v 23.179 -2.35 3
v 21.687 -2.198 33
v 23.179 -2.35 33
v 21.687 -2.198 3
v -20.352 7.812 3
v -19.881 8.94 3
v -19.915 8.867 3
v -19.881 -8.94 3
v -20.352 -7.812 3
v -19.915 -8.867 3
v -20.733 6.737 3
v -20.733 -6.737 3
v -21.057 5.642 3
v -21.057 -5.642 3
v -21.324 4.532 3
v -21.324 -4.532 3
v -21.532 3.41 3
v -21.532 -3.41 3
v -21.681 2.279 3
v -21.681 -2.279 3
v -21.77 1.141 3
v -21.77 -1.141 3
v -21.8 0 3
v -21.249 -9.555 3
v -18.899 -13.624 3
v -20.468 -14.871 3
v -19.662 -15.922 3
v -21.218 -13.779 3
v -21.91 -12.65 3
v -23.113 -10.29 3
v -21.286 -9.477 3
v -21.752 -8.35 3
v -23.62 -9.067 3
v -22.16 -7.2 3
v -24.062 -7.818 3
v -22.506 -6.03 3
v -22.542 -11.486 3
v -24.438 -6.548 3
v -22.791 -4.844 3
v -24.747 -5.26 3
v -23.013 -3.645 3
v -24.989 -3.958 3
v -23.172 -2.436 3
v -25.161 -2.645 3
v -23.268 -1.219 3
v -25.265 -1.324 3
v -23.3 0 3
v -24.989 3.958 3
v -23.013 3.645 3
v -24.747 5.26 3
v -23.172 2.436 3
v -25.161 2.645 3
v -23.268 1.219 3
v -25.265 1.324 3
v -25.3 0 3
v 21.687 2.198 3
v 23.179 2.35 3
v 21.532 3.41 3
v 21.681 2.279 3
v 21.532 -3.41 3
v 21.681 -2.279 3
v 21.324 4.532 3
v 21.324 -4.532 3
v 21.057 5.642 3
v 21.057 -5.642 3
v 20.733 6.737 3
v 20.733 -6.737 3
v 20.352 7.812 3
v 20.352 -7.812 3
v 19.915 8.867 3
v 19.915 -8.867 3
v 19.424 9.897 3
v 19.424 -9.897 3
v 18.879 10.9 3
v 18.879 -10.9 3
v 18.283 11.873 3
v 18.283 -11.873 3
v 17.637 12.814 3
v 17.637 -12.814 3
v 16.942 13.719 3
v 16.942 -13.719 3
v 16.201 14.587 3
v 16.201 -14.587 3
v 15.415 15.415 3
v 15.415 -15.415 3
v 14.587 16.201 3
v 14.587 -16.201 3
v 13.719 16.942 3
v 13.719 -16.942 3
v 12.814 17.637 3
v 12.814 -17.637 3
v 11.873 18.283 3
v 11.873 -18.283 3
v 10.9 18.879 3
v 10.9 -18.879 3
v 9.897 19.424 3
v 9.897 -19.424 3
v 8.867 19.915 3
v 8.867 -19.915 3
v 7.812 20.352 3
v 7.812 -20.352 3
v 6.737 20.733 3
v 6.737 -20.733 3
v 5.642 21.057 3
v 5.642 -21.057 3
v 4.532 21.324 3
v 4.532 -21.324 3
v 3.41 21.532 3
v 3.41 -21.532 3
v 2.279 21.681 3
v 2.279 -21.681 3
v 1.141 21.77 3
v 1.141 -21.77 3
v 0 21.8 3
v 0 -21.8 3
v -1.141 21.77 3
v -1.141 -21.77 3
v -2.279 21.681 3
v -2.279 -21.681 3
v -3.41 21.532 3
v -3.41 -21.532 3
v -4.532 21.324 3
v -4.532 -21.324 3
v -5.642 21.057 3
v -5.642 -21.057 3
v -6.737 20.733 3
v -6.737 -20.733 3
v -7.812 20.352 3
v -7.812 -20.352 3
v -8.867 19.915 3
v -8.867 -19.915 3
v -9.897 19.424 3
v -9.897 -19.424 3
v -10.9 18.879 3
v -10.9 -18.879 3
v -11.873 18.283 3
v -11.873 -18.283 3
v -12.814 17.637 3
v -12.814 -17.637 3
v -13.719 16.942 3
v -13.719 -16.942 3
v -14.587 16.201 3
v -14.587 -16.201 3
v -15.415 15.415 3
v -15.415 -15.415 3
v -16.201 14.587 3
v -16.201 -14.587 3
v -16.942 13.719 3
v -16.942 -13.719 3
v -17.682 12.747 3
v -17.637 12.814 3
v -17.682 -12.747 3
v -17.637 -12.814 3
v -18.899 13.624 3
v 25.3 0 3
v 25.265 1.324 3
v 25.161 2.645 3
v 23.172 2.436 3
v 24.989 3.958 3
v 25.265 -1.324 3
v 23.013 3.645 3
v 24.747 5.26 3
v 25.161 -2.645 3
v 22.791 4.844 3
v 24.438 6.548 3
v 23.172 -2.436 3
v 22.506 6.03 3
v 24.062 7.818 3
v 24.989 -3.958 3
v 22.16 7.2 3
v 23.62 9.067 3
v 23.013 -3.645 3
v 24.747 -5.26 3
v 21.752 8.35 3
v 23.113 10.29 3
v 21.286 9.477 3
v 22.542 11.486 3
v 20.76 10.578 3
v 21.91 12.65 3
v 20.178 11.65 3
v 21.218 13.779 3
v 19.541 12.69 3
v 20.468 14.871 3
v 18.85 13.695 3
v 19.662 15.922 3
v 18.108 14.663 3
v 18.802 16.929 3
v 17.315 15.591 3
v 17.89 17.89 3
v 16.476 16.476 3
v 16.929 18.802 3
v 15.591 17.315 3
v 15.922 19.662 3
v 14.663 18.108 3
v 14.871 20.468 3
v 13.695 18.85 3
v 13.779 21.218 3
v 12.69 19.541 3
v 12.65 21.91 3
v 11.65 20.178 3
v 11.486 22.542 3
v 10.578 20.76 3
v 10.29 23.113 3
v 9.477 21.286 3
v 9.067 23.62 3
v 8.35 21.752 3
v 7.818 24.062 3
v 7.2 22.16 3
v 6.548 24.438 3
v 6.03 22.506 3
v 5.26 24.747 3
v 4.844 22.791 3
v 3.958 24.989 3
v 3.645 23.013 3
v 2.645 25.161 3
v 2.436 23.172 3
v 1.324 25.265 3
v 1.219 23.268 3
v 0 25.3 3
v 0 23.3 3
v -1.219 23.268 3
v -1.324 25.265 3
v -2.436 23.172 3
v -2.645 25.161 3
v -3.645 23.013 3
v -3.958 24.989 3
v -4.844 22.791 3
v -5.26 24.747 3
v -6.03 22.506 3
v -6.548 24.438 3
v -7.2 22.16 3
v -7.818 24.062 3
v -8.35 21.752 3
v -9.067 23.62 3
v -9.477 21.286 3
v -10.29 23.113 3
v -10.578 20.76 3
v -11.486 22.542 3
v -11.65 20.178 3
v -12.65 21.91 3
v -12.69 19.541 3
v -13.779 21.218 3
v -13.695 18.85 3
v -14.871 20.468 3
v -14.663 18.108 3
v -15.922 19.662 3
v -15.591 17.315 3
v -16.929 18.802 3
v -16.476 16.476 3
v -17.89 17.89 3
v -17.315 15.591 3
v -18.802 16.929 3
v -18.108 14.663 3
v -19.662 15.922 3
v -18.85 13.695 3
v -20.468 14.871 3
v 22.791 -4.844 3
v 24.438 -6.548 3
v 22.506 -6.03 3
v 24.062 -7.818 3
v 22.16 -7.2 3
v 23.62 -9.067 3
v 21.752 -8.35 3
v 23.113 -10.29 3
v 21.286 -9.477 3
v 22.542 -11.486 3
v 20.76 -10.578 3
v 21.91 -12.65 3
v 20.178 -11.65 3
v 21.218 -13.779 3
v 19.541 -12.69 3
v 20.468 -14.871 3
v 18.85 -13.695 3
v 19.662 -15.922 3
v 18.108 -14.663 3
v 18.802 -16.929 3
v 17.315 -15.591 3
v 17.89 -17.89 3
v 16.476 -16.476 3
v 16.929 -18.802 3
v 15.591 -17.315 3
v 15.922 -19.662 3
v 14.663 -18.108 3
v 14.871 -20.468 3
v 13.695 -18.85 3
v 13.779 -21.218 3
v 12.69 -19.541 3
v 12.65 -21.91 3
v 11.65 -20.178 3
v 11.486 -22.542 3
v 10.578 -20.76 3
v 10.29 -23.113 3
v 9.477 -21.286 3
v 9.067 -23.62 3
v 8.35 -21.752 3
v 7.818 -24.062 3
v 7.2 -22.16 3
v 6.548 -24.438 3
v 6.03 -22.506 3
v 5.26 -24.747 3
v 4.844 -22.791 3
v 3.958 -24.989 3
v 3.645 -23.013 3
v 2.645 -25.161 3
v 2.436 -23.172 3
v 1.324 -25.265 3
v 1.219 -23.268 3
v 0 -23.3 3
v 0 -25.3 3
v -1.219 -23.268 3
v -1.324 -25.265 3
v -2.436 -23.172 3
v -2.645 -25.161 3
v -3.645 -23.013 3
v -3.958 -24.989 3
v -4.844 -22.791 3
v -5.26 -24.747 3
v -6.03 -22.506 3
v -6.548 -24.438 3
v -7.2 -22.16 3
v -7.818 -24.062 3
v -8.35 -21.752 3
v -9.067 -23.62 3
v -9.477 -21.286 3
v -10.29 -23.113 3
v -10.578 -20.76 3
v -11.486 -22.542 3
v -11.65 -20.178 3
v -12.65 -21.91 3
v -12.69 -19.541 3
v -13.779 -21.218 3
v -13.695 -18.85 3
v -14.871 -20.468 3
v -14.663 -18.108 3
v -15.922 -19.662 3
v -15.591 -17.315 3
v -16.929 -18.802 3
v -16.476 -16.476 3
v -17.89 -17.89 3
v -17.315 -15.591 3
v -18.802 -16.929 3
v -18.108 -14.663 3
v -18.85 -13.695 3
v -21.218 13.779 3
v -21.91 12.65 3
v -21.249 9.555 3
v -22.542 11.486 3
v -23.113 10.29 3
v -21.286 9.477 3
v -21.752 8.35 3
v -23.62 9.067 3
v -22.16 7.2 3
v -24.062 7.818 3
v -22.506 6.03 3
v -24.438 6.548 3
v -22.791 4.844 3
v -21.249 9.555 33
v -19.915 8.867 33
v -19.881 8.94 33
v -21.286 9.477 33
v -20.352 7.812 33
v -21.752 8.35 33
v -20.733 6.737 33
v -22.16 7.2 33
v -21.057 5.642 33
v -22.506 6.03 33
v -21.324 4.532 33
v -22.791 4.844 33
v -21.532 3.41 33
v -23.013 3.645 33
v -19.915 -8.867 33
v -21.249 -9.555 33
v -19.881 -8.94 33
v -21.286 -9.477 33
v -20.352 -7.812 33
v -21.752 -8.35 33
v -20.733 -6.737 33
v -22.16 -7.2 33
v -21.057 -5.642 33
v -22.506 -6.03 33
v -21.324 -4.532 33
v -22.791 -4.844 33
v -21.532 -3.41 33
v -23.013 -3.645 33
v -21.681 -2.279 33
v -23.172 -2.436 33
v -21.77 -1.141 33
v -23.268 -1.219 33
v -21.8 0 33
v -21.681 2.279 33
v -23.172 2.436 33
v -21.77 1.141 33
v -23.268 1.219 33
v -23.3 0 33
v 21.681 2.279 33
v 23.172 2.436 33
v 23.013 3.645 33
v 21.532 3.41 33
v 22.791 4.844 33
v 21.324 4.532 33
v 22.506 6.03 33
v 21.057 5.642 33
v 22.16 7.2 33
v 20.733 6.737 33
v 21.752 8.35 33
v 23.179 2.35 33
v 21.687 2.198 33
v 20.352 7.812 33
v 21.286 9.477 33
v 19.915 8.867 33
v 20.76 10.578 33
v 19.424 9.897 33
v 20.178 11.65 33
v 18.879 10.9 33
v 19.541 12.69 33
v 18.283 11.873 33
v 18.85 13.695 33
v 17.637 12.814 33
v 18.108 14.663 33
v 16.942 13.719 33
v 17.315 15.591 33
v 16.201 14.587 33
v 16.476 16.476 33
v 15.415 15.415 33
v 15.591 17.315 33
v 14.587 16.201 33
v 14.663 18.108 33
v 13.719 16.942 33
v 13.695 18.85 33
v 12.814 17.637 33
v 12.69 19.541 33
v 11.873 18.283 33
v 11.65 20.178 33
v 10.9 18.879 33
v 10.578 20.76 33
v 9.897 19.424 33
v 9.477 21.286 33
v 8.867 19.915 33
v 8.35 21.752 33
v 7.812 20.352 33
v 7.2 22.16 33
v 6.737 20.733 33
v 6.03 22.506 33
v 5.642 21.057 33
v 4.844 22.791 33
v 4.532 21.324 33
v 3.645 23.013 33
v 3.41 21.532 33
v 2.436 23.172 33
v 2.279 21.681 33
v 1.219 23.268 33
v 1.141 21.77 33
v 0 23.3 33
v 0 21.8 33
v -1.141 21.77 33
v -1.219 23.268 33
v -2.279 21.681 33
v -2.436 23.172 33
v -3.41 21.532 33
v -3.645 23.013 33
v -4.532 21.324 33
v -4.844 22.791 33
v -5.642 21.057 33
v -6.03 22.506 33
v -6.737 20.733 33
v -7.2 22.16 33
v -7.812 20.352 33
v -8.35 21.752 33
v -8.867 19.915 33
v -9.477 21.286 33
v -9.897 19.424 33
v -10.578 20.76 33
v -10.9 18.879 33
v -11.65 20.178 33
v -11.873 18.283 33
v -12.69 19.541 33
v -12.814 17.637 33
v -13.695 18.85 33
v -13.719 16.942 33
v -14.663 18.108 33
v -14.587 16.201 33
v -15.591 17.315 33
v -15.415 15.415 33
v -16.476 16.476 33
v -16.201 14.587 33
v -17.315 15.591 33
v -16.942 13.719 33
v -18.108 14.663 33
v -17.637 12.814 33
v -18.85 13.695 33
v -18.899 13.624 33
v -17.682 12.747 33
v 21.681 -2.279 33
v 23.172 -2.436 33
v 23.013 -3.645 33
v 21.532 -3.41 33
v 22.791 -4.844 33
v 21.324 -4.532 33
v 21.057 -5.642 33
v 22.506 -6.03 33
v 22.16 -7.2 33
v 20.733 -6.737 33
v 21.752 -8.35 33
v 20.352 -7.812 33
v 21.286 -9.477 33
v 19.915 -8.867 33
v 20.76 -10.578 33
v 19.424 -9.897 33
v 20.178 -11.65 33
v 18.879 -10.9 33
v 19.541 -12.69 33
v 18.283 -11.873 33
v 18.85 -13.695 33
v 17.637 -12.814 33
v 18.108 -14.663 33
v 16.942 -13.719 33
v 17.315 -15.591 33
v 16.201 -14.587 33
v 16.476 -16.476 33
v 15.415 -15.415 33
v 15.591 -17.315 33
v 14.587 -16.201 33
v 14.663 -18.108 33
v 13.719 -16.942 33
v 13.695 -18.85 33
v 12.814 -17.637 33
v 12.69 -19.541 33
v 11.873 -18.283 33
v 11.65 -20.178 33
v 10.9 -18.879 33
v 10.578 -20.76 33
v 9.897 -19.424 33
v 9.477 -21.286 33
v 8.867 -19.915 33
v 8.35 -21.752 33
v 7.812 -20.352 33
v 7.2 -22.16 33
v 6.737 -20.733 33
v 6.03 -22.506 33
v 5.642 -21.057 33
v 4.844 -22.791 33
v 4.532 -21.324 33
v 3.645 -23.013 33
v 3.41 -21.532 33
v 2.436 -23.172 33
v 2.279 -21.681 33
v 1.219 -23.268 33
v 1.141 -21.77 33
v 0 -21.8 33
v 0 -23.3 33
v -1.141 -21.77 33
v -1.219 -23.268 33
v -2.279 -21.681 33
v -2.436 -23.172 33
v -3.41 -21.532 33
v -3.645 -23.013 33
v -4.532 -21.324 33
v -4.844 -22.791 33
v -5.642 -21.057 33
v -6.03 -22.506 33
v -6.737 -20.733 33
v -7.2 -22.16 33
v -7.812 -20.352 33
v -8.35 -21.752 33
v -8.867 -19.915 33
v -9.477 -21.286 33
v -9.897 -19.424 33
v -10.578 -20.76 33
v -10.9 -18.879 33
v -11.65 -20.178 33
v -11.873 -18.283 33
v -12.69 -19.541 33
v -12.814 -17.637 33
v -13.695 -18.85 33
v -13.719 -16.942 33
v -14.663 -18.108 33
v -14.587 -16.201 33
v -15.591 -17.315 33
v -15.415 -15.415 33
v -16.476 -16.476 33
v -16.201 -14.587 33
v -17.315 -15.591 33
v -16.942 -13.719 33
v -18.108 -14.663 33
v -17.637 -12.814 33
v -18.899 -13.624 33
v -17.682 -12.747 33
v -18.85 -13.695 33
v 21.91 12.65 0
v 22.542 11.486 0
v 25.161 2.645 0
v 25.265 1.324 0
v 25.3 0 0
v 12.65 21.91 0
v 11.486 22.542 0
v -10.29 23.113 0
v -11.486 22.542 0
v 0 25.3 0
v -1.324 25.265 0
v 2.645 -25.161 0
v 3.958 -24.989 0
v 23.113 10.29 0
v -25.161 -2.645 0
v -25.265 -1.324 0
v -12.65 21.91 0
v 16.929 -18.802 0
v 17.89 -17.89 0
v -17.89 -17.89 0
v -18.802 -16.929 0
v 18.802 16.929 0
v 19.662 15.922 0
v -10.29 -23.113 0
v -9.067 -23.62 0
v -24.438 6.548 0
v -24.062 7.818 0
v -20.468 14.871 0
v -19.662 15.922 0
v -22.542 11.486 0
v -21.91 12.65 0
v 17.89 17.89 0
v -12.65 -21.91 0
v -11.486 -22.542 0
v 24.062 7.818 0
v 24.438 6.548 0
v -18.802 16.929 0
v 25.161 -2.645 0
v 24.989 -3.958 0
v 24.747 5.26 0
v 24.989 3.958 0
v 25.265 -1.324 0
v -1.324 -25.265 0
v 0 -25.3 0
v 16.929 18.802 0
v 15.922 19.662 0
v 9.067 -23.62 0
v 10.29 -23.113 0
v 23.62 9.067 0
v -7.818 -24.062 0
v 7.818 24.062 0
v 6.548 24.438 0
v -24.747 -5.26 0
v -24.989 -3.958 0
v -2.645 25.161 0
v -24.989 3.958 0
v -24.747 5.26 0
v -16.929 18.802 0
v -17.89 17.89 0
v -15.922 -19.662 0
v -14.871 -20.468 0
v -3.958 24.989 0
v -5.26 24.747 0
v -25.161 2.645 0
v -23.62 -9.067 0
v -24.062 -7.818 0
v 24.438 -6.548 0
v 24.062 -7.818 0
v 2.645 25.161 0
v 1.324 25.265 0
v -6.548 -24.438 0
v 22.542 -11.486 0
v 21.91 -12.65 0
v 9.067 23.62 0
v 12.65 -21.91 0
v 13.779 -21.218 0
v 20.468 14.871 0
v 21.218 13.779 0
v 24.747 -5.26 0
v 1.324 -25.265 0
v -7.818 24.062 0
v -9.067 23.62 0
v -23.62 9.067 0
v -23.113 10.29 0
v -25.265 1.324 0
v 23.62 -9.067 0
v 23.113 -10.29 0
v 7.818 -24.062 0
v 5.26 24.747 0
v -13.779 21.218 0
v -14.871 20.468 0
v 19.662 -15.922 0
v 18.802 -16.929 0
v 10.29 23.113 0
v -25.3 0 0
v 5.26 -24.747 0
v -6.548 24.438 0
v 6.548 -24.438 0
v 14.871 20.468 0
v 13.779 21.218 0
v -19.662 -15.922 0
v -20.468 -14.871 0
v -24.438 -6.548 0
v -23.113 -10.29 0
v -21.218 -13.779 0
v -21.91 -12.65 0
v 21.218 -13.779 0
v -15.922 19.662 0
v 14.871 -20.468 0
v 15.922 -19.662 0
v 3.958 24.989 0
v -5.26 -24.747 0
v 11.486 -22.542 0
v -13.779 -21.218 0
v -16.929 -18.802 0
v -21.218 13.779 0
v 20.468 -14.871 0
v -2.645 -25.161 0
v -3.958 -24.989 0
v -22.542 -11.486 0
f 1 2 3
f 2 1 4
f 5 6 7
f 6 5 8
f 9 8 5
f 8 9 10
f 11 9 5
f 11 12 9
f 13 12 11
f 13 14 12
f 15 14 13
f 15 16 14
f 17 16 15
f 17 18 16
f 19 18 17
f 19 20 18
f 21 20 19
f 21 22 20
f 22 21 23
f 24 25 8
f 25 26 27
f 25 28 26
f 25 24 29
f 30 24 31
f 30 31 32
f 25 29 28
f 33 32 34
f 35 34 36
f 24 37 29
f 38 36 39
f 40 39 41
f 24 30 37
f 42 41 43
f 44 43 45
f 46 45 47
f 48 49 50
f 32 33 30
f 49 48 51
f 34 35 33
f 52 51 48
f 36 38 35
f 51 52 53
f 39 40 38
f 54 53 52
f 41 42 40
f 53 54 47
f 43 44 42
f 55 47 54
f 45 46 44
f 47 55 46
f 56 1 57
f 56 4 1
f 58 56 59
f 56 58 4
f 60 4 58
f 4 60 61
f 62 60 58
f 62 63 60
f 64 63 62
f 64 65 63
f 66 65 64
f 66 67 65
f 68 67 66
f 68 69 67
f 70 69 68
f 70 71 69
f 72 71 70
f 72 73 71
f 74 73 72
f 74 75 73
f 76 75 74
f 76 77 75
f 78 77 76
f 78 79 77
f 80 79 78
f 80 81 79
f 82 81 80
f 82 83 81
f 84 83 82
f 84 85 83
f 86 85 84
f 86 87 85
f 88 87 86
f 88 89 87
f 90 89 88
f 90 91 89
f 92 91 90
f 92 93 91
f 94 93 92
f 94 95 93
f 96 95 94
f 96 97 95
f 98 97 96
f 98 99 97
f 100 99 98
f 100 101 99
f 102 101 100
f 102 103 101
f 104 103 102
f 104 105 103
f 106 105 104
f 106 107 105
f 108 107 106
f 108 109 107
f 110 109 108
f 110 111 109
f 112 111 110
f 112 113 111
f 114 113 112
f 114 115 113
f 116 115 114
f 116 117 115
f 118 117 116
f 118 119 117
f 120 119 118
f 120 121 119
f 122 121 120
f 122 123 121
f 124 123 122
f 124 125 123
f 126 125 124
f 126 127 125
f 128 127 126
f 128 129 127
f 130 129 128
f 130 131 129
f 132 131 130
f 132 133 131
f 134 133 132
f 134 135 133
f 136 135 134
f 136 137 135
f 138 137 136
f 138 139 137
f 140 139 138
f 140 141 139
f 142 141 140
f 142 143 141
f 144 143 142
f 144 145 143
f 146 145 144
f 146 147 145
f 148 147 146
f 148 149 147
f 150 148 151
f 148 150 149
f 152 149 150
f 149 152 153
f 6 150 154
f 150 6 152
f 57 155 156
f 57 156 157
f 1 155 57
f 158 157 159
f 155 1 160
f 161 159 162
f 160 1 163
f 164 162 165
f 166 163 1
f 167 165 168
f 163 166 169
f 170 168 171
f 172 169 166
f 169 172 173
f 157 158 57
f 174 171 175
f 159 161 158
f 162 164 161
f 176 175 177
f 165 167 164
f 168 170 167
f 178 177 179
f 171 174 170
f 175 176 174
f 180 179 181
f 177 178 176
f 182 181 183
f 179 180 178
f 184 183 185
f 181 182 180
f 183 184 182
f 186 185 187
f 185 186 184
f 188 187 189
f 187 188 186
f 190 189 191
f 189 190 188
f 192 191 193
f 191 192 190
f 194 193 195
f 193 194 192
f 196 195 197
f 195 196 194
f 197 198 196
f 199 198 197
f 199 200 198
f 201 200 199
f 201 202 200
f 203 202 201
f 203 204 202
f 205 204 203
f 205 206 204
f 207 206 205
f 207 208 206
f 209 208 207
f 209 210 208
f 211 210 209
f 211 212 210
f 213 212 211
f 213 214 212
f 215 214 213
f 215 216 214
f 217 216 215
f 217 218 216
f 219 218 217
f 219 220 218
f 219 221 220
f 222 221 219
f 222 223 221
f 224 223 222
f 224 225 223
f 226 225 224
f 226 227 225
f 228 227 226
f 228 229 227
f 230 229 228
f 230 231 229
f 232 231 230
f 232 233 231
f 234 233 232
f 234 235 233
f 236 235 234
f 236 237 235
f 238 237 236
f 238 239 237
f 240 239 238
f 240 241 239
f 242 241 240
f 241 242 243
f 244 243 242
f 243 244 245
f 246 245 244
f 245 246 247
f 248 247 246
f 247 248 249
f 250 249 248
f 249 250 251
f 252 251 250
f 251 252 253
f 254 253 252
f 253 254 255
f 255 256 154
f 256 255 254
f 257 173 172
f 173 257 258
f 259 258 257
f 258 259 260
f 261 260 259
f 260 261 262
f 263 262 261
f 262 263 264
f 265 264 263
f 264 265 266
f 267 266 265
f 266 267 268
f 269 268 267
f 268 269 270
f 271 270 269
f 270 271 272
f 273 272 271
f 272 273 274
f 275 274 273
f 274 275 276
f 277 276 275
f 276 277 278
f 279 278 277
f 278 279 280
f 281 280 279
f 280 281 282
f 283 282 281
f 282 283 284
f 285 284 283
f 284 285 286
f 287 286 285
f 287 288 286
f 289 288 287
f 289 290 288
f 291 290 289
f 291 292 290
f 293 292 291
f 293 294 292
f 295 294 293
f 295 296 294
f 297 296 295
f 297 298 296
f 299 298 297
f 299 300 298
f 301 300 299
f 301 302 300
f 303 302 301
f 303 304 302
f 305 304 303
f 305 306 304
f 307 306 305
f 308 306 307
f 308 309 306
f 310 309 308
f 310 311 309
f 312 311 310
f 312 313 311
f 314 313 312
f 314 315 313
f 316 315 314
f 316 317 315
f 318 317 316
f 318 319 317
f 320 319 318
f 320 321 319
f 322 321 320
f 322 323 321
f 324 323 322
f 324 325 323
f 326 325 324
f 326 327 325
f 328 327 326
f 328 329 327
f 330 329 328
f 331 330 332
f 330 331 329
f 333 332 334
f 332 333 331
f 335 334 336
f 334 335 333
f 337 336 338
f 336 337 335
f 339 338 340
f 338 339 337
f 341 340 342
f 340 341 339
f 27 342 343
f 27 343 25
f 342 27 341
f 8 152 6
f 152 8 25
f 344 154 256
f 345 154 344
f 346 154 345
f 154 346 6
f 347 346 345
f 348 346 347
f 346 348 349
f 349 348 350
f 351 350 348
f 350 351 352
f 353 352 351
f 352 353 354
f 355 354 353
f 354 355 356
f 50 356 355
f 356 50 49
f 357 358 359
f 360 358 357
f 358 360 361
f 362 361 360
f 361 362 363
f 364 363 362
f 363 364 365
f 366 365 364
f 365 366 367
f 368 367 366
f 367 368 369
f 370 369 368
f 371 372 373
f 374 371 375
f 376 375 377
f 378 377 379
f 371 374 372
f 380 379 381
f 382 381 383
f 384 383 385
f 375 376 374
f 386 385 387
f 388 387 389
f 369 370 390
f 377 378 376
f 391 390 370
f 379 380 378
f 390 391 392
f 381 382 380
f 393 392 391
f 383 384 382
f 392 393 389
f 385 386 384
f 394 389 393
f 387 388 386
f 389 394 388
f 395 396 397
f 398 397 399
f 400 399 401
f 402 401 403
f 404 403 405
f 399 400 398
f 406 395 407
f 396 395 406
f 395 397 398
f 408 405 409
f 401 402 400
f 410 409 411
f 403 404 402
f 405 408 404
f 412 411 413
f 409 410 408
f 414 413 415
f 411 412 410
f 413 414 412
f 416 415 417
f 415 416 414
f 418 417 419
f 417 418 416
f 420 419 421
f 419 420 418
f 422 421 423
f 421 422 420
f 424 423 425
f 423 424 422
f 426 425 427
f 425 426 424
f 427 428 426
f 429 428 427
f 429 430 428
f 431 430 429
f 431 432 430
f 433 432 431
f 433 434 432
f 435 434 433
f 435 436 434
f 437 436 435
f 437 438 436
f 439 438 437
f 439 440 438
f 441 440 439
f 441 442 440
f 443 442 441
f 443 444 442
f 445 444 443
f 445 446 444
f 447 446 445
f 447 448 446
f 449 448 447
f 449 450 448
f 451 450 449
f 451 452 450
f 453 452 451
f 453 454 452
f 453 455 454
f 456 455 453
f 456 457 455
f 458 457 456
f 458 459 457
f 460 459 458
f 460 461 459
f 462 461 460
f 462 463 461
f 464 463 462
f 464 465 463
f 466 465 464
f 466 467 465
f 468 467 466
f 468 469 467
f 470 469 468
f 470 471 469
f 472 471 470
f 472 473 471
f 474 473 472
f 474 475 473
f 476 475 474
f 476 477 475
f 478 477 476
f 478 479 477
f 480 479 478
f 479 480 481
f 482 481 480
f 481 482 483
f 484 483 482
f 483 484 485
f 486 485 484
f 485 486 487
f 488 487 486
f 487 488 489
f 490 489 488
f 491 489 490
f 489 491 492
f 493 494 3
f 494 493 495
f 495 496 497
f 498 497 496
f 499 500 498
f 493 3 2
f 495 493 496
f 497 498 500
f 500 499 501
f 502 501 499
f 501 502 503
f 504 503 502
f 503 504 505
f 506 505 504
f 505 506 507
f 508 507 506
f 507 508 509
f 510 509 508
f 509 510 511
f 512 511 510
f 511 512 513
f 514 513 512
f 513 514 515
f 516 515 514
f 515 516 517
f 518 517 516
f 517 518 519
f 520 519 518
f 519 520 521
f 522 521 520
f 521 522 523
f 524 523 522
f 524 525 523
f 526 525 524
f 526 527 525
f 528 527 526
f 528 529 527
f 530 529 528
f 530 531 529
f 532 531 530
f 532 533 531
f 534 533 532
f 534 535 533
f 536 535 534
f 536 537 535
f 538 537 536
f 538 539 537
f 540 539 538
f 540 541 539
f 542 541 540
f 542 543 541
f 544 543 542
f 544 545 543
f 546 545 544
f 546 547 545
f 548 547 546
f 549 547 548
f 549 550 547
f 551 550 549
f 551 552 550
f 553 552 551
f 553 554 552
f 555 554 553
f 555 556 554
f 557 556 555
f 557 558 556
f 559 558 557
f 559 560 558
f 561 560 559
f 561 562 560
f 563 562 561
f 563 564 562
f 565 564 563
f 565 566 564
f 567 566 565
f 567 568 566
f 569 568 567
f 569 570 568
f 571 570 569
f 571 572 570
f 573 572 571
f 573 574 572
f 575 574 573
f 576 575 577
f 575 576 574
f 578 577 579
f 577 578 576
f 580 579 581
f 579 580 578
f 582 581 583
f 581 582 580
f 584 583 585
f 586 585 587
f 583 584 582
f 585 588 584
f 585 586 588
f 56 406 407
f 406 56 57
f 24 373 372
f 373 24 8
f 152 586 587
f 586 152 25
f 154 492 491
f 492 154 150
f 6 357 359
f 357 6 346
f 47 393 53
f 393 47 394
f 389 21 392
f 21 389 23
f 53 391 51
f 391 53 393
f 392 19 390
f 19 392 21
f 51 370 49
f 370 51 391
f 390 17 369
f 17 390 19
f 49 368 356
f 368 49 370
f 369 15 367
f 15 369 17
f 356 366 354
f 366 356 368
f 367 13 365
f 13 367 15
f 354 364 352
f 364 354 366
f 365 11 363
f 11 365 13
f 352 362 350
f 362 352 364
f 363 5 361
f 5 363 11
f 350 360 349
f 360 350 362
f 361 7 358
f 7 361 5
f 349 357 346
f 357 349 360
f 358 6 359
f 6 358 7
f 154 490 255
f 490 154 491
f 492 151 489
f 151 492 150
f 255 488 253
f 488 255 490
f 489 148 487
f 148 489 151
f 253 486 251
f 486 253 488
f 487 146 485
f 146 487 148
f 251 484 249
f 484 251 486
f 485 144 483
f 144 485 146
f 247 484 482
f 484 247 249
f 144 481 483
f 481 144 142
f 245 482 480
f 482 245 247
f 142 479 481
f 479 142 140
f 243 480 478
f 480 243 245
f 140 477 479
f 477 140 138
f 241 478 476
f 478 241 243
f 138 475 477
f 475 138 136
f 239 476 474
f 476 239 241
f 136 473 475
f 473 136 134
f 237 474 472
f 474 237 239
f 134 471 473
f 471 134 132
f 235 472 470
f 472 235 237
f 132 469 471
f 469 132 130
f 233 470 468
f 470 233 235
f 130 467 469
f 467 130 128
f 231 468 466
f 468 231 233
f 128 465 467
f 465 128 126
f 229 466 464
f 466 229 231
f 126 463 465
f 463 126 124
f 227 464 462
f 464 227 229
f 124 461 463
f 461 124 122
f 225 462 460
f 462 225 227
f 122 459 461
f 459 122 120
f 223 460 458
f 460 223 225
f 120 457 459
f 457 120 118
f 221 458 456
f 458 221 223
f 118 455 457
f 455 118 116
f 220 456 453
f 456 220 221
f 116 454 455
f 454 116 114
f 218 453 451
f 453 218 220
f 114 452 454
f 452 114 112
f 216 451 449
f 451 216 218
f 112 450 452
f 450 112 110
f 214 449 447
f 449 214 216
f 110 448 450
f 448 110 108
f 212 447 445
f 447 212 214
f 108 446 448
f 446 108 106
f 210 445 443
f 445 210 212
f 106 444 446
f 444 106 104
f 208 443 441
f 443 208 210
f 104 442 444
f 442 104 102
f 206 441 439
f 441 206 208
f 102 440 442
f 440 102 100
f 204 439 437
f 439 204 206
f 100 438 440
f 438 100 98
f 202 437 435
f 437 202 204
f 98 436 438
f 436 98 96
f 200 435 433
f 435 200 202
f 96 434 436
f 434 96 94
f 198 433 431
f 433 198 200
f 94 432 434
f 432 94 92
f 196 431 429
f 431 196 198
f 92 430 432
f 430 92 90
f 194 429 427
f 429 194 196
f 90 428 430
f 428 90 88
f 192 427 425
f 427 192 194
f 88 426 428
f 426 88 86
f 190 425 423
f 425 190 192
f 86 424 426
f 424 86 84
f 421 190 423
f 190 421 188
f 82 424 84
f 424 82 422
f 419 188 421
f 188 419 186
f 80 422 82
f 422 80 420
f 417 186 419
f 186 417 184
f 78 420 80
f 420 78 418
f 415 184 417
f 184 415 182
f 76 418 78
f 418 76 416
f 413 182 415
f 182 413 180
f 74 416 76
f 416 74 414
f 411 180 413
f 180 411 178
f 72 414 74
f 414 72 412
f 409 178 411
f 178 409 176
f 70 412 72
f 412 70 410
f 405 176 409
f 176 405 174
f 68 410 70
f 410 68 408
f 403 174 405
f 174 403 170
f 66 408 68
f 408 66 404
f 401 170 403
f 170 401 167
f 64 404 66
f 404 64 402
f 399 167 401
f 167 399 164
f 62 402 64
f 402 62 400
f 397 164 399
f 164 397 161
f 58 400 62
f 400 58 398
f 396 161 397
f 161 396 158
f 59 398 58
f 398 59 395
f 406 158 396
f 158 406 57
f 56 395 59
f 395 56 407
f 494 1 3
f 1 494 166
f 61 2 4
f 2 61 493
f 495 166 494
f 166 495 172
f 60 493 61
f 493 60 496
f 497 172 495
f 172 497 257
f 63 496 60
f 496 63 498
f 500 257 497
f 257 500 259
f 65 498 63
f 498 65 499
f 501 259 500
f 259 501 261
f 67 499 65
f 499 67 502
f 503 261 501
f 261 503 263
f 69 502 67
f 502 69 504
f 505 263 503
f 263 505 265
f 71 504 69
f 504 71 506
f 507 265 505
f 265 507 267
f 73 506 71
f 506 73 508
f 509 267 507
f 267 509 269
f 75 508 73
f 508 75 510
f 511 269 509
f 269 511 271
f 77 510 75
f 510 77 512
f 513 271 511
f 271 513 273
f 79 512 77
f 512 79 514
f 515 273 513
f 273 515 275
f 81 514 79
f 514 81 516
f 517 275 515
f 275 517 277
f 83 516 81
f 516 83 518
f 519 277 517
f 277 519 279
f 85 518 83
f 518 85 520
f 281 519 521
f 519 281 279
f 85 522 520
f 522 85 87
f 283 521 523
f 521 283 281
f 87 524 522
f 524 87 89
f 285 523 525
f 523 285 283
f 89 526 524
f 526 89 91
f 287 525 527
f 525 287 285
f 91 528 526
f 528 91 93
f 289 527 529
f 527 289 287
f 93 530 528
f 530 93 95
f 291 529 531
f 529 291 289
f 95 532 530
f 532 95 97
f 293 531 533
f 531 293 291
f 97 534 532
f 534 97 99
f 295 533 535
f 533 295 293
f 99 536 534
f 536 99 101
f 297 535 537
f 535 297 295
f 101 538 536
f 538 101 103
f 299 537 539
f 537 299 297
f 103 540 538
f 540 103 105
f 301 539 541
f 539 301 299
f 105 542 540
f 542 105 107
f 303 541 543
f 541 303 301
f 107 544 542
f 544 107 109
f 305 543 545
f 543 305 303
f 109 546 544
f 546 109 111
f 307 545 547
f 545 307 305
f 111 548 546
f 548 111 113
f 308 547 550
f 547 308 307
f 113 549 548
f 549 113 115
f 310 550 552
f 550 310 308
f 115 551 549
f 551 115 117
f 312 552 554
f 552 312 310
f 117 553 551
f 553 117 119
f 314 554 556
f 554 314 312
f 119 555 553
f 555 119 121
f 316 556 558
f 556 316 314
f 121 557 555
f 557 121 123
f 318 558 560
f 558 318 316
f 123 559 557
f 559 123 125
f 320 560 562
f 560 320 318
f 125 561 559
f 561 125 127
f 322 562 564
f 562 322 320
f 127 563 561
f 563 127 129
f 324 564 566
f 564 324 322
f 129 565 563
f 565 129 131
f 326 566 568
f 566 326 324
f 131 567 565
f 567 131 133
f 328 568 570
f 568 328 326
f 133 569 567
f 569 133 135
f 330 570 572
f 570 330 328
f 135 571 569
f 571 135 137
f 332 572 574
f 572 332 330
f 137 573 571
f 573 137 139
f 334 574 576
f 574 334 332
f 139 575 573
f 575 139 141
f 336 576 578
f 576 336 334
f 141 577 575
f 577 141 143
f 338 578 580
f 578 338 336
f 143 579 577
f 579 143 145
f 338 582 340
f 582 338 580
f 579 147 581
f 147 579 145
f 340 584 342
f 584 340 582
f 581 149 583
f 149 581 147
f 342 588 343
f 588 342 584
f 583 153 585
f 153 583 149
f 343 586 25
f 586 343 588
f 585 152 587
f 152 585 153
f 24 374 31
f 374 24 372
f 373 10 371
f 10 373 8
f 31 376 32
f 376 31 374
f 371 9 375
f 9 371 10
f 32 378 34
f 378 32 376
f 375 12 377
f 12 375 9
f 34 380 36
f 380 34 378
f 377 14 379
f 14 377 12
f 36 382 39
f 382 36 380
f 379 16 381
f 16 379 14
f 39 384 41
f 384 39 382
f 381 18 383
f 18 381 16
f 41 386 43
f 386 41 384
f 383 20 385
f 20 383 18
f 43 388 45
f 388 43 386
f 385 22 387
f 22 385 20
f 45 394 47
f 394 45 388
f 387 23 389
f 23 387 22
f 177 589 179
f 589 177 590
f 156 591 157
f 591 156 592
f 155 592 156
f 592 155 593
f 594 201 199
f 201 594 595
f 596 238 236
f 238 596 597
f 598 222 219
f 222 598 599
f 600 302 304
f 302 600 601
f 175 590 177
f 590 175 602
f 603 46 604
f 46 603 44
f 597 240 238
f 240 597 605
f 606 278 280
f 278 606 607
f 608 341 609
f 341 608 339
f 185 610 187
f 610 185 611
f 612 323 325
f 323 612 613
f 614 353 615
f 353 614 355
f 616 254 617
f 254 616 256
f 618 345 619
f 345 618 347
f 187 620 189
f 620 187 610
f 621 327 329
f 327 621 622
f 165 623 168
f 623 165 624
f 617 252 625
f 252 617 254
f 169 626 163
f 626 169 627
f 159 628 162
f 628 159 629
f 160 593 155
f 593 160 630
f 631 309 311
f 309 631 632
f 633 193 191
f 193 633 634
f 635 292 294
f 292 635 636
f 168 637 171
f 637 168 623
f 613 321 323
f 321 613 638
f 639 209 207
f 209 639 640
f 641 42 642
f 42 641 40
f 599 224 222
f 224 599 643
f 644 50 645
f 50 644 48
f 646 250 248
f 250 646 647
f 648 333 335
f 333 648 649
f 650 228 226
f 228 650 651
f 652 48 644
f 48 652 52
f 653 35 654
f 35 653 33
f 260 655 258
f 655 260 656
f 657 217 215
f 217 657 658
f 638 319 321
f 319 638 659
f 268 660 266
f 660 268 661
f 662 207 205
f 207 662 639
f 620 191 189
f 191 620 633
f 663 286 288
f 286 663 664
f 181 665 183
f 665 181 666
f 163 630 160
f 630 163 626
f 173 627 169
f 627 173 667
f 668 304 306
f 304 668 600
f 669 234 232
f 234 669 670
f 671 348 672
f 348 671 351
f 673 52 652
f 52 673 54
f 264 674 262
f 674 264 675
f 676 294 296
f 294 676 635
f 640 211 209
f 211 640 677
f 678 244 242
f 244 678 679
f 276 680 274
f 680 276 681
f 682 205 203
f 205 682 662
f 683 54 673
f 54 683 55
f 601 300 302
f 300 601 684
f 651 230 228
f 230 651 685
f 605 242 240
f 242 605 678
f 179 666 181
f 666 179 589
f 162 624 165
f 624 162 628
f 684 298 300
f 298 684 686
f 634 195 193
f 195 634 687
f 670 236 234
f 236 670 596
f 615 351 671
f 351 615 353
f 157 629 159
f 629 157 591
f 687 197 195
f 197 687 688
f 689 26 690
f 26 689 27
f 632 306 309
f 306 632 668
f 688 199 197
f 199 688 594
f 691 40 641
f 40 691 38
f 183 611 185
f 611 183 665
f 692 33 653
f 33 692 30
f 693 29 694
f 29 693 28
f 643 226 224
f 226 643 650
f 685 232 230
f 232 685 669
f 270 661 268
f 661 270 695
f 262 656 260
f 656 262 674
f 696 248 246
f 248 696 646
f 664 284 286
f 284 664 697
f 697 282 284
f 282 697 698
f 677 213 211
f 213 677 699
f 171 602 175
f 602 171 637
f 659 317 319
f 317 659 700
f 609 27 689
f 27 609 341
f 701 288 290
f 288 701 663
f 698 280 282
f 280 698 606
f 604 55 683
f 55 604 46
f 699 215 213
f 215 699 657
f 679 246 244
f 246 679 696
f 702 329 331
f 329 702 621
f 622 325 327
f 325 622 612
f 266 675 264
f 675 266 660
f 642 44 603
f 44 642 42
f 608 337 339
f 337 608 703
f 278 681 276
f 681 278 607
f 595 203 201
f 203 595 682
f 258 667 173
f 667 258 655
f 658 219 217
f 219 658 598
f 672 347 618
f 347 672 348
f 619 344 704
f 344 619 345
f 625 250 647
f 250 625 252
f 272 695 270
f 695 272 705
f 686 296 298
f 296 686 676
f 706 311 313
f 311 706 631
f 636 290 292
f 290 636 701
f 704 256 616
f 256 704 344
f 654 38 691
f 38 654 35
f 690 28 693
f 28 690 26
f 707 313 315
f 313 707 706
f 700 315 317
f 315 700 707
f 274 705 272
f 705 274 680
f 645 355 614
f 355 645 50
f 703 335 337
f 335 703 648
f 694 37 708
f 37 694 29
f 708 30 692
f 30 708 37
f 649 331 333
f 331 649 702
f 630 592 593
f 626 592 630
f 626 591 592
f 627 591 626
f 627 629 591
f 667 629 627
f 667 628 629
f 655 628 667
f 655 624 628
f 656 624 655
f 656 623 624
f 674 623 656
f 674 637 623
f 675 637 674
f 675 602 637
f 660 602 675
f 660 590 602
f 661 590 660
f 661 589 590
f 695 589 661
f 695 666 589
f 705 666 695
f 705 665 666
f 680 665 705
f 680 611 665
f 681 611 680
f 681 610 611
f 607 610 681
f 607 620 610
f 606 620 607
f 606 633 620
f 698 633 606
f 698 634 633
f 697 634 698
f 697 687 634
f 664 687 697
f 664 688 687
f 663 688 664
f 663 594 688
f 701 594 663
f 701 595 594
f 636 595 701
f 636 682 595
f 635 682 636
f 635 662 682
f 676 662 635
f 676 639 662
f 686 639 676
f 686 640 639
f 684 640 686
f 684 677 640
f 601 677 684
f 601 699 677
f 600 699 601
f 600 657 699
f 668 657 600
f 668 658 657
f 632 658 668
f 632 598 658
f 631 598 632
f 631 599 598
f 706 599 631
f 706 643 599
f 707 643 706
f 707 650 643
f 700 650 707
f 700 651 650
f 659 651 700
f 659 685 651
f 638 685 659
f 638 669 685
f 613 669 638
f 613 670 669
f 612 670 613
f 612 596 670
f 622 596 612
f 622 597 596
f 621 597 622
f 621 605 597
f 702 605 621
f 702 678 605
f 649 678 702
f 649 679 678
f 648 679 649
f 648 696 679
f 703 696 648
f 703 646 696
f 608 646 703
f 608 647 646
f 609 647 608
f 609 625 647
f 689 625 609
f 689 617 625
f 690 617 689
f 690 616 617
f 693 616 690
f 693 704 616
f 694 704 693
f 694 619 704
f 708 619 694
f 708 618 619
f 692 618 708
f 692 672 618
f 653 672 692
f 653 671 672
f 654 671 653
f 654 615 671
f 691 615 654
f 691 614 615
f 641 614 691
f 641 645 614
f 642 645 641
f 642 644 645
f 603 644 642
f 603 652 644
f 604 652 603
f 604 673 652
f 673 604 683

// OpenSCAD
// file: rotate_extrude.scad
// From http://forum.openscad.org/rotate-extrude-angle-always-360-td19035.html

module rotate_extrude2(angle=360, convexity=2, size=1000) {

  module angle_cut(angle=90,size=1000) {
    x = size*cos(angle/2);
    y = size*sin(angle/2);
    translate([0,0,-size]) 
      linear_extrude(2*size) polygon([[0,0],[x,y],[x,size],[-size,size],[-size,-size],[x,-size],[x,-y]]);
  }

  // support for angle parameter in rotate_extrude was added after release 2015.03 
  // Thingiverse customizer is still on 2015.03
  angleSupport = (version_num() > 20150399) ? true : false; // Next openscad releases after 2015.03.xx will have support angle parameter
  // Using angle parameter when possible provides huge speed boost, avoids a difference operation

  if (angleSupport || angle == 360) {
    rotate_extrude(angle=angle,convexity=convexity)
      children();
  } else {
    rotate([0,0,angle/2]) difference() {
      rotate_extrude(convexity=convexity) children();
      angle_cut(angle, size);
    }
  }
}
// file: sharedparams.scad
// Main parameters
compartmentDiameter = 40;
compartmentHeight = 30;
numRings = 2;
positionLabels = [
    "A", "B", "C", "D", "E", "F", "G", "H", "I", "J",
    "K", "L", "M", "N", "O", "P", "Q", "R", "S", "T",
    "U", "V", "W", "X", "Y", "Z"
];

// Inner shell
isInnerRadius = compartmentDiameter / 2;
isThick = 1.5;
isOuterRadius = isInnerRadius + isThick;
isInnerHeight = compartmentHeight;
isBaseThick = 3;
isOuterHeight = isInnerHeight + isBaseThick;
isProngSpanAngle = 10; // angular width of the lock prongs

// Outer shell
isOsClearance = 0.3; // Clearance on radius
osInnerRadius = isOuterRadius + isOsClearance;
osThick = 1.5;
osOuterRadius = osInnerRadius + osThick;
osInnerHeight = isInnerHeight;
osBaseThick = isBaseThick;
osOuterHeight = osInnerHeight + osBaseThick;
osBaseOverhang = 2;
osBaseRadius = osOuterRadius + osBaseOverhang;
osSlotClearance = 0.3; // Clearance on each side of the fins to the outer shell slots
osSlotSpanAngle = isProngSpanAngle + 360 * osSlotClearance / (2 * PI * osInnerRadius) * 2;

// Rings
ringSpacing = compartmentHeight / numRings;
osRingClearance = 0.3;
osProngProtrusion = 3; // Amount lock prongs protrude from the OD of the outer shell
isProngProtrusion = isOsClearance + osThick + osProngProtrusion; // amount the lock prongs extend from the OD of the inner shell cylinder
prongHeight = osProngProtrusion + 1; // total height of lock prongs, at the OD of the outer shell


// Misc
latchAngles = [ 0, 180+30, 180-30 ];

// System
$fa = 3;
$fs = 0.5;
// main file
include <sharedparams.scad>
include <rotate_extrude.scad>

module OuterShell() {
    difference() {
        // Hollow cylinder
        rotate_extrude2()
            translate([osInnerRadius, osBaseThick])
                square([osThick, osInnerHeight]);
        
        // Slots
        for (ang = latchAngles)
            rotate([0, 0, -osSlotSpanAngle/2 + ang])
                rotate_extrude2(angle=osSlotSpanAngle)
                    translate([0, osBaseThick])
                        square([1000, osInnerHeight]);
    };
    
    // Base
    cylinder(h=osBaseThick, r=osBaseRadius);
};

OuterShell();
